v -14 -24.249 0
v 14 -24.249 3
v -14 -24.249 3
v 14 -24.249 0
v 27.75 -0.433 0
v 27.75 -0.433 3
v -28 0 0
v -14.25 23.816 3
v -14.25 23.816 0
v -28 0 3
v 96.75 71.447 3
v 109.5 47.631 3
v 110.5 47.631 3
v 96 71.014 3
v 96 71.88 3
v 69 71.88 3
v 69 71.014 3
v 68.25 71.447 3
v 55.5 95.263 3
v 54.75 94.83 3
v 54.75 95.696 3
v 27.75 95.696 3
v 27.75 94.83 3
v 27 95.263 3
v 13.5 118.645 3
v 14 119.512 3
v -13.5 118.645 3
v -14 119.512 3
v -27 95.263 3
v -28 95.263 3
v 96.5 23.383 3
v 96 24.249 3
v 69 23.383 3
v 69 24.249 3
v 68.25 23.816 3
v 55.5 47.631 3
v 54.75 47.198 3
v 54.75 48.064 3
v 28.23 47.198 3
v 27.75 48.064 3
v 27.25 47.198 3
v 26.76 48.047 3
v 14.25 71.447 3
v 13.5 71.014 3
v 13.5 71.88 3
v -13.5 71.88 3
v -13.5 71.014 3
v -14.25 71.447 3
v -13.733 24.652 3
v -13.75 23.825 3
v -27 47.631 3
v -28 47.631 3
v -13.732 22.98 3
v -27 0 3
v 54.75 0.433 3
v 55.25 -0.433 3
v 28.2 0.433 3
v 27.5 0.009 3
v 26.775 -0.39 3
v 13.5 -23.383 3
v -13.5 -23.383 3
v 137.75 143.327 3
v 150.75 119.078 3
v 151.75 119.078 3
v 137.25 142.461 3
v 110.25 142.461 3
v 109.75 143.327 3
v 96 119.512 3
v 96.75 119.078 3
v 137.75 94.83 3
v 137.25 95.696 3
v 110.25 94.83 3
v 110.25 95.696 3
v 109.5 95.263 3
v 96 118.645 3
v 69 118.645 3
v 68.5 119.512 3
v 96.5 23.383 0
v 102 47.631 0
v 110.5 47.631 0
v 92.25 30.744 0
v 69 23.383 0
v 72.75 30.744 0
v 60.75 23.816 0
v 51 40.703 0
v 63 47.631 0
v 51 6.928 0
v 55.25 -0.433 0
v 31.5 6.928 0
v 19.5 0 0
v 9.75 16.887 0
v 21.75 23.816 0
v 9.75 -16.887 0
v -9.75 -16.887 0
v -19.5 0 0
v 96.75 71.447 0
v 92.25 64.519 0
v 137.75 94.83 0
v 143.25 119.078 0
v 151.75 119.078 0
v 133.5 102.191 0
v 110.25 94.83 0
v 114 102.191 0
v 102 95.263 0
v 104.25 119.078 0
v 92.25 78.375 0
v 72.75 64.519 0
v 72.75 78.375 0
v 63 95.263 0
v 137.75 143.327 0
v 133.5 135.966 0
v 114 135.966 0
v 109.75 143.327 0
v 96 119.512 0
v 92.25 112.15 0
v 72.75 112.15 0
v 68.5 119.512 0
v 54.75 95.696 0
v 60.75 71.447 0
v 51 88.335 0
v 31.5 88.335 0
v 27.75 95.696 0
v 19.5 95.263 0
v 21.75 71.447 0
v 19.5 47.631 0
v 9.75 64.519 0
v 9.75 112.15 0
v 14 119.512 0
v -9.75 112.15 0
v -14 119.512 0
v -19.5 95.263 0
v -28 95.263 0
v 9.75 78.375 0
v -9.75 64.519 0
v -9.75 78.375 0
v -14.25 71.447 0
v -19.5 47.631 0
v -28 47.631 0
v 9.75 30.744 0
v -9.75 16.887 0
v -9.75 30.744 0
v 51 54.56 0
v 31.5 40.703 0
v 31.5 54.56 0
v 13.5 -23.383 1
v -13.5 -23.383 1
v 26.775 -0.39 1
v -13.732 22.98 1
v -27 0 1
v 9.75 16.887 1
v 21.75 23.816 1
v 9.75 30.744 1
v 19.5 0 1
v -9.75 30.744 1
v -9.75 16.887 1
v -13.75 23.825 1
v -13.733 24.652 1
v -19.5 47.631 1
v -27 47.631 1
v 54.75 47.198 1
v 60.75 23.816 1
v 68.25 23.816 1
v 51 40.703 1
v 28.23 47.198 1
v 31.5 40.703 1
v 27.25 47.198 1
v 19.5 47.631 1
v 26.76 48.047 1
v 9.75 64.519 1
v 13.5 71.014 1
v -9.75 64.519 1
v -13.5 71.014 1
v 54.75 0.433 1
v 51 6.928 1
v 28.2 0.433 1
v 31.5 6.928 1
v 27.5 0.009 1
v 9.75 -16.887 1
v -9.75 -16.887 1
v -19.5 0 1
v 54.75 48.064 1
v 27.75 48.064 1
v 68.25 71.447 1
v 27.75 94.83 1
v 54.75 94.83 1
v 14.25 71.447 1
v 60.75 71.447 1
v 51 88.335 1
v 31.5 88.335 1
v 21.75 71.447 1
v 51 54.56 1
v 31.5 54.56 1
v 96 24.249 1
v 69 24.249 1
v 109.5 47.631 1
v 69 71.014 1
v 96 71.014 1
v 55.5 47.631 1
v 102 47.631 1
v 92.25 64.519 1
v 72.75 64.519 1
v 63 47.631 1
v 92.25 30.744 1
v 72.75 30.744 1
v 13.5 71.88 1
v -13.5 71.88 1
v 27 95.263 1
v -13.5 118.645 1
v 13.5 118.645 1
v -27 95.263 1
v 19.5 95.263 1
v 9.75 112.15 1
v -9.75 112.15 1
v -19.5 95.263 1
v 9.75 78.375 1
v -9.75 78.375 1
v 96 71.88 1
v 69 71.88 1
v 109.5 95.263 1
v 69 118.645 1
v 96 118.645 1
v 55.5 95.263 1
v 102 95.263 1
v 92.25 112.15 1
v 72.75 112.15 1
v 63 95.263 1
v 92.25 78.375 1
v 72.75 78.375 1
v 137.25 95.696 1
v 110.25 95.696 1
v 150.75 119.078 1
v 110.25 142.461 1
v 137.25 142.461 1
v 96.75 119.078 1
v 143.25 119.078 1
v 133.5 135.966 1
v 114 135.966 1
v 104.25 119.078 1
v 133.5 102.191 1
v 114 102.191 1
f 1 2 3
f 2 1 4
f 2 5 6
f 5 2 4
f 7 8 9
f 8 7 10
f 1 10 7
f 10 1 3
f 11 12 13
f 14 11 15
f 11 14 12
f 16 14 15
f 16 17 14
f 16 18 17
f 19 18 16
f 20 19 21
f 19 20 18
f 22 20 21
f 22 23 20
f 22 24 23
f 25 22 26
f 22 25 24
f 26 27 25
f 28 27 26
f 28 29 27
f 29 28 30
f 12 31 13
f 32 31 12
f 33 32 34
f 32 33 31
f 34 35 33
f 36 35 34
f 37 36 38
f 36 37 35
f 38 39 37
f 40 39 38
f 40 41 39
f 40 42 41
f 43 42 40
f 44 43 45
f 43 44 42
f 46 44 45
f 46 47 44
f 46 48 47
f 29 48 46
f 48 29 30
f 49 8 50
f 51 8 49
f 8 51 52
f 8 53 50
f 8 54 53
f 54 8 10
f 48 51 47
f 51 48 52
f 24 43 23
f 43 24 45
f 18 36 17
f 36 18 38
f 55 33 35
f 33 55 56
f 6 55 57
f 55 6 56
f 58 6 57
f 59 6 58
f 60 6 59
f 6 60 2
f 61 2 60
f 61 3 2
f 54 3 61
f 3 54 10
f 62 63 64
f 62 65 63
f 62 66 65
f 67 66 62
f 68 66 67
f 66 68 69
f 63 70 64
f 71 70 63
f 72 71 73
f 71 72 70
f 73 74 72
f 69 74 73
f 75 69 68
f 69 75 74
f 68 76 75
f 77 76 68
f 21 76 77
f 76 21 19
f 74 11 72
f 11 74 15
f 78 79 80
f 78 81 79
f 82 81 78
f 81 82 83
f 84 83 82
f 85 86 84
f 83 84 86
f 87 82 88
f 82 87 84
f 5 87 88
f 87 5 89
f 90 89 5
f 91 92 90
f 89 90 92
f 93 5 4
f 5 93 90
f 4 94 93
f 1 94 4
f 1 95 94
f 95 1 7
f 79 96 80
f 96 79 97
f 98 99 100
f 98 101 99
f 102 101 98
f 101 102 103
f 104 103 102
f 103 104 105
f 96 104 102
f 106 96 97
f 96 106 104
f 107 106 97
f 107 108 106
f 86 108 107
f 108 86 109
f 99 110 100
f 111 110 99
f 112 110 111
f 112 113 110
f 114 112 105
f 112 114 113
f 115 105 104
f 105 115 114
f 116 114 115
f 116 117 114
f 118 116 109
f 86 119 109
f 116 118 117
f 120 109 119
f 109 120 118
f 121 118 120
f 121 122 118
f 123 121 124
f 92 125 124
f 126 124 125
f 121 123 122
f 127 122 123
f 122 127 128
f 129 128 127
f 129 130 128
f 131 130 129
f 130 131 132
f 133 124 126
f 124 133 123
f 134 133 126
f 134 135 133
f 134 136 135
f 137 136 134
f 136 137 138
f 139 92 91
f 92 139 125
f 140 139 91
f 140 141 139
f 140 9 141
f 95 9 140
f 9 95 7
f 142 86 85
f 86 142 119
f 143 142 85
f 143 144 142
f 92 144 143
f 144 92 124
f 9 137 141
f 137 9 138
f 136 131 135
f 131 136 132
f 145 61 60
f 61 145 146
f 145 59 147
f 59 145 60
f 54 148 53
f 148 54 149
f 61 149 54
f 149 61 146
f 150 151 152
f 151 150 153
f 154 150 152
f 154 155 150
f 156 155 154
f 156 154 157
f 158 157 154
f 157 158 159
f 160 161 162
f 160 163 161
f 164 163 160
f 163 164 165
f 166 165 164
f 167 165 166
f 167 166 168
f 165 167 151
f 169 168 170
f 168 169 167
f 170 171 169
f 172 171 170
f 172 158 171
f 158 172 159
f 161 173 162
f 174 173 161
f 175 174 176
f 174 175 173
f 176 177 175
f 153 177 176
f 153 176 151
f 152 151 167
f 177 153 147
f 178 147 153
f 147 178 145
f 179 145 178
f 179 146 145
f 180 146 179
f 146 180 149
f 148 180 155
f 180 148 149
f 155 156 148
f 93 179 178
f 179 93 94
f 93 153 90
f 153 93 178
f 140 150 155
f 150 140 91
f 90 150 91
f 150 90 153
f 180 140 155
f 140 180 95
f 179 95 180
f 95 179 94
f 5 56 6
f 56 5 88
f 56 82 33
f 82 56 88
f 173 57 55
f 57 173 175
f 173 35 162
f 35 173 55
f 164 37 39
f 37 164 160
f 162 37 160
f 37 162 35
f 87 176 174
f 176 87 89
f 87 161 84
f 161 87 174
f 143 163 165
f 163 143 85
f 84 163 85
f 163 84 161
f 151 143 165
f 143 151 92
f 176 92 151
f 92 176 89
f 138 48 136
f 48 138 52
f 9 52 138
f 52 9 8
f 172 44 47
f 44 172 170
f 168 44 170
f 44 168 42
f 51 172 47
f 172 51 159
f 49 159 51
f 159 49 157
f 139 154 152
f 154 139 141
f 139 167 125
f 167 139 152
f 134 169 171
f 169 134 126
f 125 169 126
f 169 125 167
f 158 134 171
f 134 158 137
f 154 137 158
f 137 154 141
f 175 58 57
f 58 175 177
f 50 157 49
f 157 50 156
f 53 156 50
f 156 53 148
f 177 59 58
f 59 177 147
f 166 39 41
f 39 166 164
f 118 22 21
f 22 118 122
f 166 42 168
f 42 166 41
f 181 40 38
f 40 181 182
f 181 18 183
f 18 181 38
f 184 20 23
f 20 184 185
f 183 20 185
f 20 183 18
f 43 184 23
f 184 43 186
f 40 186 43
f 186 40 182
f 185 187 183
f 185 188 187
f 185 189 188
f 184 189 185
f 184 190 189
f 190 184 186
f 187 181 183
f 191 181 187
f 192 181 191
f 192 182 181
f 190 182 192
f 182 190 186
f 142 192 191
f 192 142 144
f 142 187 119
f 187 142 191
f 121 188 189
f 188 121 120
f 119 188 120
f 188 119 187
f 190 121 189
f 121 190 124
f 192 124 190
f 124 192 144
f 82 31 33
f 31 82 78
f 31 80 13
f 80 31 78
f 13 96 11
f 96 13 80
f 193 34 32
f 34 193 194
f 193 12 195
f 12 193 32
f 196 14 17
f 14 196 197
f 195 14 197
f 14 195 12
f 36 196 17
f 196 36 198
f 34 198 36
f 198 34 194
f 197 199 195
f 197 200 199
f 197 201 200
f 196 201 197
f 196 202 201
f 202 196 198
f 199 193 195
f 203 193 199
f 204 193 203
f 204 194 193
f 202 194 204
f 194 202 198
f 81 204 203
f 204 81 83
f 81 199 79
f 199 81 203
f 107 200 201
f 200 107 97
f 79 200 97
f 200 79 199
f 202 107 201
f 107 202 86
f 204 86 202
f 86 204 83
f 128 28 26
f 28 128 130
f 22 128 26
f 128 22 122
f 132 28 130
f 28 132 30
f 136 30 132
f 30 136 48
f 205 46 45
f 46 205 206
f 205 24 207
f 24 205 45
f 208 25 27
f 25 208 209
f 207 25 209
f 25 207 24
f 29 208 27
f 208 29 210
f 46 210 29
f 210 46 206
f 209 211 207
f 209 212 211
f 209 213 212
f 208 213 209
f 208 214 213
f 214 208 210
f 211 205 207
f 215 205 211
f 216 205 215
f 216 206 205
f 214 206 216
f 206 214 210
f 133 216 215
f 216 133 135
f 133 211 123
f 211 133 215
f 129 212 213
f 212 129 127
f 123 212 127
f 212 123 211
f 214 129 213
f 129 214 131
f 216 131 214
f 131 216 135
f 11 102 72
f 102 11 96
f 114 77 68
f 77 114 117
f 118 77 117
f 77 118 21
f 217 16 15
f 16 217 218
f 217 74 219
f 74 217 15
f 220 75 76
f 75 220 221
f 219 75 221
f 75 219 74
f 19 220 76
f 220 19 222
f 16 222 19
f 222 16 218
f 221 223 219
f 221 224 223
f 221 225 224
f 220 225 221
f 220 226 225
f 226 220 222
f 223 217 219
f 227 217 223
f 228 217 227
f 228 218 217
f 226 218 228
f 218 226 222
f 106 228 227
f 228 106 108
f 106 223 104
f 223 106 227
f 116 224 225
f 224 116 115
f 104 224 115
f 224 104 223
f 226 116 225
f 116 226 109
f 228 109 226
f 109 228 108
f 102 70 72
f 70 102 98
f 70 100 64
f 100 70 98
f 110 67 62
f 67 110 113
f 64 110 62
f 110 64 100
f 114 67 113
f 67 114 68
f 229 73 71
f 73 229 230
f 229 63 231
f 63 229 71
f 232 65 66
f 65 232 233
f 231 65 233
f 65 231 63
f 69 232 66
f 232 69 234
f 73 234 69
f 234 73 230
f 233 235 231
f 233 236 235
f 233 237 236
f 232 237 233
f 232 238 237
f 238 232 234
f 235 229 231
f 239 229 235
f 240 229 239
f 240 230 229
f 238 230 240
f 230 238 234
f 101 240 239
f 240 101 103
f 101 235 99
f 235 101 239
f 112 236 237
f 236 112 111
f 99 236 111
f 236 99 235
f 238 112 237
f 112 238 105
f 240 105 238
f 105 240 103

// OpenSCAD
$fn = 150;

union() {
	difference() {
		union() {
			translate(v = [0.0, 0.0, 0]) {
				difference() {
					cylinder($fn = 6, d = 56.0, h = 3.0);
					translate(v = [0, 0, 1.0]) {
						cylinder($fn = 6, d = 54.0, h = 3.0);
					}
					translate(v = [0, 0, -1]) {
						cylinder($fn = 6, d = 39, h = 3.0);
					}
				}
			}
			translate(v = [41.25, 23.81569860407206, 0]) {
				difference() {
					cylinder($fn = 6, d = 56.0, h = 3.0);
					translate(v = [0, 0, 1.0]) {
						cylinder($fn = 6, d = 54.0, h = 3.0);
					}
					translate(v = [0, 0, -1]) {
						cylinder($fn = 6, d = 39, h = 3.0);
					}
				}
			}
			translate(v = [0.0, 47.63139720814412, 0]) {
				difference() {
					cylinder($fn = 6, d = 56.0, h = 3.0);
					translate(v = [0, 0, 1.0]) {
						cylinder($fn = 6, d = 54.0, h = 3.0);
					}
					translate(v = [0, 0, -1]) {
						cylinder($fn = 6, d = 39, h = 3.0);
					}
				}
			}
		}
		translate(v = [13.75, 23.824673200287624, 1.0]) {
			cylinder(d = 55.0, h = 3.5);
		}
	}
	translate(v = [41.25, 71.44709581221619, 0]) {
		difference() {
			cylinder($fn = 6, d = 56.0, h = 3.0);
			translate(v = [0, 0, 1.0]) {
				cylinder($fn = 6, d = 54.0, h = 3.0);
			}
			translate(v = [0, 0, -1]) {
				cylinder($fn = 6, d = 39, h = 3.0);
			}
		}
	}
	translate(v = [82.5, 47.63139720814412, 0]) {
		difference() {
			cylinder($fn = 6, d = 56.0, h = 3.0);
			translate(v = [0, 0, 1.0]) {
				cylinder($fn = 6, d = 54.0, h = 3.0);
			}
			translate(v = [0, 0, -1]) {
				cylinder($fn = 6, d = 39, h = 3.0);
			}
		}
	}
	translate(v = [0.0, 95.26279441628824, 0]) {
		difference() {
			cylinder($fn = 6, d = 56.0, h = 3.0);
			translate(v = [0, 0, 1.0]) {
				cylinder($fn = 6, d = 54.0, h = 3.0);
			}
			translate(v = [0, 0, -1]) {
				cylinder($fn = 6, d = 39, h = 3.0);
			}
		}
	}
	translate(v = [82.5, 95.26279441628824, 0]) {
		difference() {
			cylinder($fn = 6, d = 56.0, h = 3.0);
			translate(v = [0, 0, 1.0]) {
				cylinder($fn = 6, d = 54.0, h = 3.0);
			}
			translate(v = [0, 0, -1]) {
				cylinder($fn = 6, d = 39, h = 3.0);
			}
		}
	}
	translate(v = [123.75, 119.0784930203603, 0]) {
		difference() {
			cylinder($fn = 6, d = 56.0, h = 3.0);
			translate(v = [0, 0, 1.0]) {
				cylinder($fn = 6, d = 54.0, h = 3.0);
			}
			translate(v = [0, 0, -1]) {
				cylinder($fn = 6, d = 39, h = 3.0);
			}
		}
	}
}
